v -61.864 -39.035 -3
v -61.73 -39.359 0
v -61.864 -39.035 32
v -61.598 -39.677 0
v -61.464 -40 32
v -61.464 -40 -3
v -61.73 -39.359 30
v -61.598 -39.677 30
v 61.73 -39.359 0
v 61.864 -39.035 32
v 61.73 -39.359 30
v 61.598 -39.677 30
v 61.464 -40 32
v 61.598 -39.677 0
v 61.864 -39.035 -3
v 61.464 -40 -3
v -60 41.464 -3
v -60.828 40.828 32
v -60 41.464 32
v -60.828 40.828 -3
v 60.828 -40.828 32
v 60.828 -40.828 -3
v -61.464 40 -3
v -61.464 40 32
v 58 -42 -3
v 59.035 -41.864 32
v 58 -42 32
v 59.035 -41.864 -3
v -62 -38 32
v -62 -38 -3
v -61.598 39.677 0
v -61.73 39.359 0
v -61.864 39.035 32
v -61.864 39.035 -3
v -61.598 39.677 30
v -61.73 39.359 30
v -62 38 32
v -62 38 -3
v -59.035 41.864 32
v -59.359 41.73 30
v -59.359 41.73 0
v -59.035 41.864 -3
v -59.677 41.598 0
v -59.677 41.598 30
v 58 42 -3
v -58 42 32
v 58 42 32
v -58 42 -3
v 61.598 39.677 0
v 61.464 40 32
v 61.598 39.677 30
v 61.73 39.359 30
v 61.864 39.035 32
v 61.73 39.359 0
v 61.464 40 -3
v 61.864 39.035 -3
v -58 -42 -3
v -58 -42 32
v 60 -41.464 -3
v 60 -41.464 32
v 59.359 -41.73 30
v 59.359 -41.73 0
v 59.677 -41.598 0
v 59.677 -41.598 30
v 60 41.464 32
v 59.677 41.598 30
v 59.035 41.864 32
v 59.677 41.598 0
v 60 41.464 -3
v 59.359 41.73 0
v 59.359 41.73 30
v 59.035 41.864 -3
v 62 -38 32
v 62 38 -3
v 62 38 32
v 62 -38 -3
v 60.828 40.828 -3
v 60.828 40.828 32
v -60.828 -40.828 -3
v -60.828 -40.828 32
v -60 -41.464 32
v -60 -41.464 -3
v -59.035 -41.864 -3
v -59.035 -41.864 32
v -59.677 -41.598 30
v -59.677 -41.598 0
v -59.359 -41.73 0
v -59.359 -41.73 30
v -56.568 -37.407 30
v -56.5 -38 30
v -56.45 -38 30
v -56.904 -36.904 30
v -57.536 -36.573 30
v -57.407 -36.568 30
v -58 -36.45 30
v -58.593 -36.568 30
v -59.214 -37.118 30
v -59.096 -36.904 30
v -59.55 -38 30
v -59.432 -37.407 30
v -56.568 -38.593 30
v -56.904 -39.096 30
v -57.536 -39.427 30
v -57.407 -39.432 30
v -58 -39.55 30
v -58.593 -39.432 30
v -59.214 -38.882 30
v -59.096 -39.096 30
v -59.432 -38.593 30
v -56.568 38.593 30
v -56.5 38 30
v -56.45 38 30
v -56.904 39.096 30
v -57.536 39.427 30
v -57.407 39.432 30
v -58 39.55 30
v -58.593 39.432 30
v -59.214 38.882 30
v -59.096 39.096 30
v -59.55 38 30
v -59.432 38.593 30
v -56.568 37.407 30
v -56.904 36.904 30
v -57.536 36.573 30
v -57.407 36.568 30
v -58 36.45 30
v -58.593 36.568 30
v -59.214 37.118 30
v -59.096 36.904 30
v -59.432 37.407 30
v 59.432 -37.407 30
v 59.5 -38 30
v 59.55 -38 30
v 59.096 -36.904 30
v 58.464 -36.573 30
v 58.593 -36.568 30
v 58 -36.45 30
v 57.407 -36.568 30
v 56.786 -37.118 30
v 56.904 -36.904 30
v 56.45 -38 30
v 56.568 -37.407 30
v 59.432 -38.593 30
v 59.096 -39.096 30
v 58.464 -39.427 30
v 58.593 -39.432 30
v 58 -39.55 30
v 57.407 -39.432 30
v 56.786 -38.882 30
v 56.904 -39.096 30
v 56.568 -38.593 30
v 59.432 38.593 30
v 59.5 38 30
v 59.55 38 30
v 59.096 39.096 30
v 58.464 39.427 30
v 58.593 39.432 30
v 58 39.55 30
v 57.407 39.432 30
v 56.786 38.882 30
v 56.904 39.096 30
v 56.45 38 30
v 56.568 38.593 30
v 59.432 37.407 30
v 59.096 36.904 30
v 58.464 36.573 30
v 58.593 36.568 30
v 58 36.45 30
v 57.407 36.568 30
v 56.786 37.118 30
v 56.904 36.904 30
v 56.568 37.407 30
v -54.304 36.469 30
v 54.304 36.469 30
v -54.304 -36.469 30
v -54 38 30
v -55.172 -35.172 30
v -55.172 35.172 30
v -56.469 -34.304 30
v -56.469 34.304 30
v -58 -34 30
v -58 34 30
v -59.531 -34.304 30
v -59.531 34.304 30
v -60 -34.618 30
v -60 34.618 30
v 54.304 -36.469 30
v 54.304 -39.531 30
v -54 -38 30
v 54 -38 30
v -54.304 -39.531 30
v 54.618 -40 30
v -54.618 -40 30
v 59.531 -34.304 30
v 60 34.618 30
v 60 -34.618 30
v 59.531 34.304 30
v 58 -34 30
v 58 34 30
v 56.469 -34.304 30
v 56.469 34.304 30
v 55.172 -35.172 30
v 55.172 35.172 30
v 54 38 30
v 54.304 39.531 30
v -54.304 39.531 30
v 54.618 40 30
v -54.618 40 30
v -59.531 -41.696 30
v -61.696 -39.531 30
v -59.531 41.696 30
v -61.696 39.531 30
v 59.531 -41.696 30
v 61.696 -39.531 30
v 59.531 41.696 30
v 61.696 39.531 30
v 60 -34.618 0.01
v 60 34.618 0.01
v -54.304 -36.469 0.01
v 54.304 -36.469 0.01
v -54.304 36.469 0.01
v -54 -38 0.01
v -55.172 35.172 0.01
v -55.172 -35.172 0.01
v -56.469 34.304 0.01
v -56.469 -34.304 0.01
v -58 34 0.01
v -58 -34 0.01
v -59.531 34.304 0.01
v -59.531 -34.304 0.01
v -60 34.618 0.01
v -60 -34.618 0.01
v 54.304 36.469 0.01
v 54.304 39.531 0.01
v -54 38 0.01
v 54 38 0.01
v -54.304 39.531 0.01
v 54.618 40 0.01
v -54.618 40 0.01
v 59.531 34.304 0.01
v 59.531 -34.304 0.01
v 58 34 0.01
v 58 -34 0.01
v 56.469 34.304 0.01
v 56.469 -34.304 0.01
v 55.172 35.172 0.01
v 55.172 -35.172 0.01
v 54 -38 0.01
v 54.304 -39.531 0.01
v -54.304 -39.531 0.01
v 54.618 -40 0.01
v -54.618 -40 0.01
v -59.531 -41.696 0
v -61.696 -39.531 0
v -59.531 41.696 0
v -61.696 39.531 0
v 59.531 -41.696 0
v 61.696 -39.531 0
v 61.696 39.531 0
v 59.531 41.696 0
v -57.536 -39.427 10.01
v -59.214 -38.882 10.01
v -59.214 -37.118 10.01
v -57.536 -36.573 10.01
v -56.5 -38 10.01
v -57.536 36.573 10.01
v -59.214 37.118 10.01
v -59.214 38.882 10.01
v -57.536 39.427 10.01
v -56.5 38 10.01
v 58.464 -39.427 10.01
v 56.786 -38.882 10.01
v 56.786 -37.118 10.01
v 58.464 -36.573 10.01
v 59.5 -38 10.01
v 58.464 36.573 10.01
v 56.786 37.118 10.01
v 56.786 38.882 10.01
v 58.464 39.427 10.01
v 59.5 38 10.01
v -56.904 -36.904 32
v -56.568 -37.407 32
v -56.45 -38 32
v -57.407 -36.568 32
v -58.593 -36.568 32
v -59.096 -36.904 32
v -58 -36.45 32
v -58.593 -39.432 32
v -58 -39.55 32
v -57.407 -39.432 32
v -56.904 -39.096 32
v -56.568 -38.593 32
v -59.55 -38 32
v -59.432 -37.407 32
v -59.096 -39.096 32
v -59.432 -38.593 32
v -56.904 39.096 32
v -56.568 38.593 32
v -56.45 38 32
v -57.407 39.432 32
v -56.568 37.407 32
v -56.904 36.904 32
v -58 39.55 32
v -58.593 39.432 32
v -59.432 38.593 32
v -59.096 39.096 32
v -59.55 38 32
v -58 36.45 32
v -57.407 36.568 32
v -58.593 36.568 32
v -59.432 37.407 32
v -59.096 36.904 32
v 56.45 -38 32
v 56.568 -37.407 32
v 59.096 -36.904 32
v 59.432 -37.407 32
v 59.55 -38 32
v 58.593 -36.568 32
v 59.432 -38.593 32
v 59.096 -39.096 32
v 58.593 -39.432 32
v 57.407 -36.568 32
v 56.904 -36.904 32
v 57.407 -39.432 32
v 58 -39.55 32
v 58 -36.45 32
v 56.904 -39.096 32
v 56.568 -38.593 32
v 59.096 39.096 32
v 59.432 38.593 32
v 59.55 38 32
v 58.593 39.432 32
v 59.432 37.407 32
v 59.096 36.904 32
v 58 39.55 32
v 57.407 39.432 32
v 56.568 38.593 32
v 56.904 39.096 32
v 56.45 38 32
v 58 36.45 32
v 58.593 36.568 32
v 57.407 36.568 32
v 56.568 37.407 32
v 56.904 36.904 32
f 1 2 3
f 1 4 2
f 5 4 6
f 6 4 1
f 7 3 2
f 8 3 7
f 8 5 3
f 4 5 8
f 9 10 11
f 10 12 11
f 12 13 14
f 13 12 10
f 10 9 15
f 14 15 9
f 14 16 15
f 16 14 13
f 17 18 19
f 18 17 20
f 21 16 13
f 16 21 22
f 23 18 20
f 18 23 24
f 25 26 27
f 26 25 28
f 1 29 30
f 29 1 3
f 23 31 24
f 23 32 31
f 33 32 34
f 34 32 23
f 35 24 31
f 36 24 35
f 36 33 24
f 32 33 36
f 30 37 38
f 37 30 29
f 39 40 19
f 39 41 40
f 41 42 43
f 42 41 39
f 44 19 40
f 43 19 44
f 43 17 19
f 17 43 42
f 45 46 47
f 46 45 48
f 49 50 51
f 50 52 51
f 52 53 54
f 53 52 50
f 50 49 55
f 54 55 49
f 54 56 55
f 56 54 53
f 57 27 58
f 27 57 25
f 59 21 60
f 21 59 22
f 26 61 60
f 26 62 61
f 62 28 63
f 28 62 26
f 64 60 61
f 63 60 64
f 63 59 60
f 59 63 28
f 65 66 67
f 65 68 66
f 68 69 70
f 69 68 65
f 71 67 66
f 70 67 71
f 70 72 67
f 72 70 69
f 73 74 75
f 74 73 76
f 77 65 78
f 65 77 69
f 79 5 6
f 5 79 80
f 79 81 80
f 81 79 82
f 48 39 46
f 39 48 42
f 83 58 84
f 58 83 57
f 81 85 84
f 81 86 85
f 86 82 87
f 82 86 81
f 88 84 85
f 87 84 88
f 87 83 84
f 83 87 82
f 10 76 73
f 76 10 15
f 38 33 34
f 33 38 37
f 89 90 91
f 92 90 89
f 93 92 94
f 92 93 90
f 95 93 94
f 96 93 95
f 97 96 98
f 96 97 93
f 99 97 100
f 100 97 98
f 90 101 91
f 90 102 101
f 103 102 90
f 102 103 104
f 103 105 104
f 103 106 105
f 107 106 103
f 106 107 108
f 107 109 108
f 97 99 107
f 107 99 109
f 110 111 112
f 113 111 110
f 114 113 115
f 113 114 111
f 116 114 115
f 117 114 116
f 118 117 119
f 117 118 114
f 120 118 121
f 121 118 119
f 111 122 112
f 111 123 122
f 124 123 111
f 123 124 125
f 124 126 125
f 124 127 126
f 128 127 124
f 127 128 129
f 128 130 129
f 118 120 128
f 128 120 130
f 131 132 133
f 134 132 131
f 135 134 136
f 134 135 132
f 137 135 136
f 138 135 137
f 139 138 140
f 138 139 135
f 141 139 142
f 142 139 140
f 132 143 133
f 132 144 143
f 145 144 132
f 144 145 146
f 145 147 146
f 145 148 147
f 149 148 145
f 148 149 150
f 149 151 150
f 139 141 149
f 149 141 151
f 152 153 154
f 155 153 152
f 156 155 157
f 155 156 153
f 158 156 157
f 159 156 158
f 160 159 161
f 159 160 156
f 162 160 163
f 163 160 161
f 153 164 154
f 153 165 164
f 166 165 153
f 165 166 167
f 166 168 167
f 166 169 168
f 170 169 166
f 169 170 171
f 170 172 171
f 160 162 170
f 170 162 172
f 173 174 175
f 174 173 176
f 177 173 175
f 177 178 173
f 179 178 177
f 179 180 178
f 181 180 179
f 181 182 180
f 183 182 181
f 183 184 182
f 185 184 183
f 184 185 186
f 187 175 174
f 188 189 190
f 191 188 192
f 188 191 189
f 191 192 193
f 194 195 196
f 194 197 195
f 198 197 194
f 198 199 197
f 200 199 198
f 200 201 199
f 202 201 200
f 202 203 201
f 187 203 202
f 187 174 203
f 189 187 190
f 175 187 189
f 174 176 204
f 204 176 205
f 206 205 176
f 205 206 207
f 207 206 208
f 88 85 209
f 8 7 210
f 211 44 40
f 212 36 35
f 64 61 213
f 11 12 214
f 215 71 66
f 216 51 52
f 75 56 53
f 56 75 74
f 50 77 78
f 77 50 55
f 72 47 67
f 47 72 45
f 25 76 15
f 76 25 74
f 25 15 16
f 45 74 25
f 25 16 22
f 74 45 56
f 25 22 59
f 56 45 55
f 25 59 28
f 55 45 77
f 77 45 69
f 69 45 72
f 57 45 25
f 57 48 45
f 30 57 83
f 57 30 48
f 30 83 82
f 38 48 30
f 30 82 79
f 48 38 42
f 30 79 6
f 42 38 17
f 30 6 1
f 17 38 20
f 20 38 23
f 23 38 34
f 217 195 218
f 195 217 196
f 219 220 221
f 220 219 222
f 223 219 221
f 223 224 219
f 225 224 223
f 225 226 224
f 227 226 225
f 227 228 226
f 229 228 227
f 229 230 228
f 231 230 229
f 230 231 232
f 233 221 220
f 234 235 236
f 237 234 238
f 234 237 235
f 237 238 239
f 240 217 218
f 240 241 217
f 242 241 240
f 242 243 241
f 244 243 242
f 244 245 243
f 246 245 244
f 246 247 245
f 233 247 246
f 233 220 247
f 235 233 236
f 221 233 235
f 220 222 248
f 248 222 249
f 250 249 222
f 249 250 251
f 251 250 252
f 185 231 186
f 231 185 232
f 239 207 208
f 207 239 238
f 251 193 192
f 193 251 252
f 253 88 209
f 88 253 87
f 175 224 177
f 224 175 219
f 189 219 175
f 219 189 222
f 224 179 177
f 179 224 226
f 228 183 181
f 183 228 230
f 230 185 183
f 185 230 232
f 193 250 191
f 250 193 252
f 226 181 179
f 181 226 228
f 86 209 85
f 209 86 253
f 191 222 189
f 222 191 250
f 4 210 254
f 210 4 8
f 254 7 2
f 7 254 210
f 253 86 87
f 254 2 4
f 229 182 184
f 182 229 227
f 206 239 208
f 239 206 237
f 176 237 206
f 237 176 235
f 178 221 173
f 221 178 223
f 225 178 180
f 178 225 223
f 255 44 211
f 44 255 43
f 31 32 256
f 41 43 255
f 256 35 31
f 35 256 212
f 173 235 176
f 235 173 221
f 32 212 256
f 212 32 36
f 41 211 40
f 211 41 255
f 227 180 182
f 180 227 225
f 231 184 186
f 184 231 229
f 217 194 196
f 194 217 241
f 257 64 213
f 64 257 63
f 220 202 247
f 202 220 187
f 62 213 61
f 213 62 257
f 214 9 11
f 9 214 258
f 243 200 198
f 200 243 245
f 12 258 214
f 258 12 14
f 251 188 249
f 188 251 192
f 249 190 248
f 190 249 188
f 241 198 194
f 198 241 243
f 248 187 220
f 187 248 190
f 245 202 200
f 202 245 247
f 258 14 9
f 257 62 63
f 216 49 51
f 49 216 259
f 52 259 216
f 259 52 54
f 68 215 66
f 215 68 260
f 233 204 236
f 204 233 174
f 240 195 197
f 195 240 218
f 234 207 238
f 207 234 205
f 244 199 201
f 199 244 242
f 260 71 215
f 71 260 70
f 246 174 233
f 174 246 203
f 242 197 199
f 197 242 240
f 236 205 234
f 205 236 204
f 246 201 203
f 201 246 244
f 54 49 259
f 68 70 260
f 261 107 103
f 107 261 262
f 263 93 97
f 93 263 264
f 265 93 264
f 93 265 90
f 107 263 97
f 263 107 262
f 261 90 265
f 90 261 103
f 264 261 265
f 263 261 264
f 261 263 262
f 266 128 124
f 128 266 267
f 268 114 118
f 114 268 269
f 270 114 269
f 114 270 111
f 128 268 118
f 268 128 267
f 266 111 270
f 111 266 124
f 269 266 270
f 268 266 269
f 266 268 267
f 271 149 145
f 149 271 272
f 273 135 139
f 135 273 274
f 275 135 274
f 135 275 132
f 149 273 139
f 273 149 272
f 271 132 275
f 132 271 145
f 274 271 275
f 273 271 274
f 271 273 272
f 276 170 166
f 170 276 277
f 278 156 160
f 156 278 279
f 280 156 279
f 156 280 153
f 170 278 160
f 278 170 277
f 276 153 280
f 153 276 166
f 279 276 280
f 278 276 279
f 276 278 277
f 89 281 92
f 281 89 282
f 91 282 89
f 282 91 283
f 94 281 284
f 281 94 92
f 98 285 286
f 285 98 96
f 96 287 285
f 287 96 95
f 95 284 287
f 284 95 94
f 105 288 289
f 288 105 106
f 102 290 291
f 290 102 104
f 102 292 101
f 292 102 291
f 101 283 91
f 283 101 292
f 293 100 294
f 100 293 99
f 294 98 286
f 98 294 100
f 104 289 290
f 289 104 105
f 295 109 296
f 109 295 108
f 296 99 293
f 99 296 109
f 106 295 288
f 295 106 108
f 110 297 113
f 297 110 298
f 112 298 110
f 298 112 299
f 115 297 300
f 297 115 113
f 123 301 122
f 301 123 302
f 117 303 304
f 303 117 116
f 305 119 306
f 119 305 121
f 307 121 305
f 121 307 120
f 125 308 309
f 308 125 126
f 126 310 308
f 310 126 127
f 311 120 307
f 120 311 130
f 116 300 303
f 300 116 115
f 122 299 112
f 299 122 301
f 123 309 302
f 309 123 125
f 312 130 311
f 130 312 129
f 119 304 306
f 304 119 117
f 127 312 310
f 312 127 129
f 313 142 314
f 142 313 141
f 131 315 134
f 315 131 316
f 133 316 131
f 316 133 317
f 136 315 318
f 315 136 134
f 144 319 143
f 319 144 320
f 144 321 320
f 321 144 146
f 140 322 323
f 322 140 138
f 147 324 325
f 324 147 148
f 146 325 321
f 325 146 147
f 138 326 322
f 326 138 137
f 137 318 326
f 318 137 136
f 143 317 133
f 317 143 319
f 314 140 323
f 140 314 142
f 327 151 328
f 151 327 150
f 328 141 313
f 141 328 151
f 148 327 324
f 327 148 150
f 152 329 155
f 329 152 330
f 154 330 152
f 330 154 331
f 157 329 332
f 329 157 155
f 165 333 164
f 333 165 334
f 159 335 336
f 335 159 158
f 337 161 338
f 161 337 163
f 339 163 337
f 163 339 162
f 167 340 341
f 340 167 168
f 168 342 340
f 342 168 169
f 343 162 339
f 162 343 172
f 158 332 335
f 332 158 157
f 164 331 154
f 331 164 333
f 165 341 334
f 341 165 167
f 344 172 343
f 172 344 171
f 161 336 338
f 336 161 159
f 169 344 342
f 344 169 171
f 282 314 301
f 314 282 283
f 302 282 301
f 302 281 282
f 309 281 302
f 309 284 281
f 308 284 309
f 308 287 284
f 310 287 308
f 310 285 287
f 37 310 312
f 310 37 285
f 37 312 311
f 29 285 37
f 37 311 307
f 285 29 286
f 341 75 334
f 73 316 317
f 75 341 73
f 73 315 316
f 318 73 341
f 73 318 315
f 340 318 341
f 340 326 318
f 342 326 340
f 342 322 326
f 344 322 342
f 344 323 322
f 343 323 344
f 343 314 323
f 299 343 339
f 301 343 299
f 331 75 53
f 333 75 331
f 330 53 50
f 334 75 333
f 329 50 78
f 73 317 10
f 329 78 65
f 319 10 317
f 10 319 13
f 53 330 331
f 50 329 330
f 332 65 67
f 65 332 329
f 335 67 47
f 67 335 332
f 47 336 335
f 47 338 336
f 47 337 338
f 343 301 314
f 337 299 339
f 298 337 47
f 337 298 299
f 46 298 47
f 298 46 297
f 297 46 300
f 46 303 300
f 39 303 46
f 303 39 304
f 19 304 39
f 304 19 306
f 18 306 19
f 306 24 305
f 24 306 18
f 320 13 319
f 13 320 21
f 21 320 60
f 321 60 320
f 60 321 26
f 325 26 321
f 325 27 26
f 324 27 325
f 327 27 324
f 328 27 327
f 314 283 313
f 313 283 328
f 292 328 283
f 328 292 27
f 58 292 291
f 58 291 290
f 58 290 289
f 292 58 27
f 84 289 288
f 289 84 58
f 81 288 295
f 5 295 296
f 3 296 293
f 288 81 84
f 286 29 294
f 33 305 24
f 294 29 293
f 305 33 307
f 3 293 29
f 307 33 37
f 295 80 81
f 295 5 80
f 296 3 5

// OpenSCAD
module ThatBox_Layout(dims, corner_radius) {
  dx = (dims[0] / 2) - corner_radius;
  dy = (dims[1] / 2) - corner_radius;

  for(x = [-dx, dx]) {
    for(y = [-dy, dy]) {
      translate([x, y]) {
        children();
      }
    }
  }
}

module ThatBox_Plate(dims, thickness, corner_radius) {
  hull() {
    ThatBox_Layout(dims, corner_radius) {
      cylinder(h = thickness, r = corner_radius, $fn = 24);
    }
  }
}

function PlateSize(inner, wall_thickness) = [inner[0] + (wall_thickness * 2), inner[1] + (wall_thickness * 2)];

module ThatBox_Box(
  inner = [120, 80, 30],
  wall_thickness = 2, 
  corner_radius = 4,
  mounting_hole_diameter = 3,
  mounting_hole_depth = 20,
  base_thickness = 3, 
) {
  plate_size = PlateSize(inner, wall_thickness);

  difference() {
    // Outer volume
    translate([0, 0, -base_thickness]) {
      ThatBox_Plate(dims = plate_size, thickness = inner[2] + base_thickness, corner_radius = corner_radius);
    }

    // Inner volume
    translate([0, 0, (inner[2] / 2) + 0.01]) {
      cube(inner, center = true);
    }
  }

  difference() {
    // Mounting hole supports
    ThatBox_Layout(dims = plate_size, corner_radius = corner_radius) {
      cylinder(h = inner[2], r = corner_radius, $fn = 16);
    }

    // Mounting holes
    ThatBox_Layout(dims = plate_size, corner_radius = corner_radius) {
      translate([0, 0, inner[2] - mounting_hole_depth + 0.01]) {
        cylinder(h = mounting_hole_depth, d = mounting_hole_diameter, $fn = 5);
      }
    }
  }
}

module ThatBox_Lid(
  inner = [120, 80, 30],
  wall_thickness = 2, 
  corner_radius = 4,
  mounting_hole_diameter = 3.1,
  lid_thickness = 2,
) {
  plate_size = PlateSize(inner, wall_thickness);

  difference() {
    // Panel
    ThatBox_Plate(dims = plate_size, thickness = lid_thickness, corner_radius = corner_radius);

    // Mounting holes
    ThatBox_Layout(dims = plate_size, corner_radius = corner_radius) {
      translate([0, 0, -1]) {
        cylinder(h = lid_thickness + 2, d = mounting_hole_diameter, $fn = 16);
      }
    }
  }
}

// Demo
color("red") {
  ThatBox_Box();
}
translate([0, 0, 30]) {
  color("blue", 0.5) {
    ThatBox_Lid();
  }
}
